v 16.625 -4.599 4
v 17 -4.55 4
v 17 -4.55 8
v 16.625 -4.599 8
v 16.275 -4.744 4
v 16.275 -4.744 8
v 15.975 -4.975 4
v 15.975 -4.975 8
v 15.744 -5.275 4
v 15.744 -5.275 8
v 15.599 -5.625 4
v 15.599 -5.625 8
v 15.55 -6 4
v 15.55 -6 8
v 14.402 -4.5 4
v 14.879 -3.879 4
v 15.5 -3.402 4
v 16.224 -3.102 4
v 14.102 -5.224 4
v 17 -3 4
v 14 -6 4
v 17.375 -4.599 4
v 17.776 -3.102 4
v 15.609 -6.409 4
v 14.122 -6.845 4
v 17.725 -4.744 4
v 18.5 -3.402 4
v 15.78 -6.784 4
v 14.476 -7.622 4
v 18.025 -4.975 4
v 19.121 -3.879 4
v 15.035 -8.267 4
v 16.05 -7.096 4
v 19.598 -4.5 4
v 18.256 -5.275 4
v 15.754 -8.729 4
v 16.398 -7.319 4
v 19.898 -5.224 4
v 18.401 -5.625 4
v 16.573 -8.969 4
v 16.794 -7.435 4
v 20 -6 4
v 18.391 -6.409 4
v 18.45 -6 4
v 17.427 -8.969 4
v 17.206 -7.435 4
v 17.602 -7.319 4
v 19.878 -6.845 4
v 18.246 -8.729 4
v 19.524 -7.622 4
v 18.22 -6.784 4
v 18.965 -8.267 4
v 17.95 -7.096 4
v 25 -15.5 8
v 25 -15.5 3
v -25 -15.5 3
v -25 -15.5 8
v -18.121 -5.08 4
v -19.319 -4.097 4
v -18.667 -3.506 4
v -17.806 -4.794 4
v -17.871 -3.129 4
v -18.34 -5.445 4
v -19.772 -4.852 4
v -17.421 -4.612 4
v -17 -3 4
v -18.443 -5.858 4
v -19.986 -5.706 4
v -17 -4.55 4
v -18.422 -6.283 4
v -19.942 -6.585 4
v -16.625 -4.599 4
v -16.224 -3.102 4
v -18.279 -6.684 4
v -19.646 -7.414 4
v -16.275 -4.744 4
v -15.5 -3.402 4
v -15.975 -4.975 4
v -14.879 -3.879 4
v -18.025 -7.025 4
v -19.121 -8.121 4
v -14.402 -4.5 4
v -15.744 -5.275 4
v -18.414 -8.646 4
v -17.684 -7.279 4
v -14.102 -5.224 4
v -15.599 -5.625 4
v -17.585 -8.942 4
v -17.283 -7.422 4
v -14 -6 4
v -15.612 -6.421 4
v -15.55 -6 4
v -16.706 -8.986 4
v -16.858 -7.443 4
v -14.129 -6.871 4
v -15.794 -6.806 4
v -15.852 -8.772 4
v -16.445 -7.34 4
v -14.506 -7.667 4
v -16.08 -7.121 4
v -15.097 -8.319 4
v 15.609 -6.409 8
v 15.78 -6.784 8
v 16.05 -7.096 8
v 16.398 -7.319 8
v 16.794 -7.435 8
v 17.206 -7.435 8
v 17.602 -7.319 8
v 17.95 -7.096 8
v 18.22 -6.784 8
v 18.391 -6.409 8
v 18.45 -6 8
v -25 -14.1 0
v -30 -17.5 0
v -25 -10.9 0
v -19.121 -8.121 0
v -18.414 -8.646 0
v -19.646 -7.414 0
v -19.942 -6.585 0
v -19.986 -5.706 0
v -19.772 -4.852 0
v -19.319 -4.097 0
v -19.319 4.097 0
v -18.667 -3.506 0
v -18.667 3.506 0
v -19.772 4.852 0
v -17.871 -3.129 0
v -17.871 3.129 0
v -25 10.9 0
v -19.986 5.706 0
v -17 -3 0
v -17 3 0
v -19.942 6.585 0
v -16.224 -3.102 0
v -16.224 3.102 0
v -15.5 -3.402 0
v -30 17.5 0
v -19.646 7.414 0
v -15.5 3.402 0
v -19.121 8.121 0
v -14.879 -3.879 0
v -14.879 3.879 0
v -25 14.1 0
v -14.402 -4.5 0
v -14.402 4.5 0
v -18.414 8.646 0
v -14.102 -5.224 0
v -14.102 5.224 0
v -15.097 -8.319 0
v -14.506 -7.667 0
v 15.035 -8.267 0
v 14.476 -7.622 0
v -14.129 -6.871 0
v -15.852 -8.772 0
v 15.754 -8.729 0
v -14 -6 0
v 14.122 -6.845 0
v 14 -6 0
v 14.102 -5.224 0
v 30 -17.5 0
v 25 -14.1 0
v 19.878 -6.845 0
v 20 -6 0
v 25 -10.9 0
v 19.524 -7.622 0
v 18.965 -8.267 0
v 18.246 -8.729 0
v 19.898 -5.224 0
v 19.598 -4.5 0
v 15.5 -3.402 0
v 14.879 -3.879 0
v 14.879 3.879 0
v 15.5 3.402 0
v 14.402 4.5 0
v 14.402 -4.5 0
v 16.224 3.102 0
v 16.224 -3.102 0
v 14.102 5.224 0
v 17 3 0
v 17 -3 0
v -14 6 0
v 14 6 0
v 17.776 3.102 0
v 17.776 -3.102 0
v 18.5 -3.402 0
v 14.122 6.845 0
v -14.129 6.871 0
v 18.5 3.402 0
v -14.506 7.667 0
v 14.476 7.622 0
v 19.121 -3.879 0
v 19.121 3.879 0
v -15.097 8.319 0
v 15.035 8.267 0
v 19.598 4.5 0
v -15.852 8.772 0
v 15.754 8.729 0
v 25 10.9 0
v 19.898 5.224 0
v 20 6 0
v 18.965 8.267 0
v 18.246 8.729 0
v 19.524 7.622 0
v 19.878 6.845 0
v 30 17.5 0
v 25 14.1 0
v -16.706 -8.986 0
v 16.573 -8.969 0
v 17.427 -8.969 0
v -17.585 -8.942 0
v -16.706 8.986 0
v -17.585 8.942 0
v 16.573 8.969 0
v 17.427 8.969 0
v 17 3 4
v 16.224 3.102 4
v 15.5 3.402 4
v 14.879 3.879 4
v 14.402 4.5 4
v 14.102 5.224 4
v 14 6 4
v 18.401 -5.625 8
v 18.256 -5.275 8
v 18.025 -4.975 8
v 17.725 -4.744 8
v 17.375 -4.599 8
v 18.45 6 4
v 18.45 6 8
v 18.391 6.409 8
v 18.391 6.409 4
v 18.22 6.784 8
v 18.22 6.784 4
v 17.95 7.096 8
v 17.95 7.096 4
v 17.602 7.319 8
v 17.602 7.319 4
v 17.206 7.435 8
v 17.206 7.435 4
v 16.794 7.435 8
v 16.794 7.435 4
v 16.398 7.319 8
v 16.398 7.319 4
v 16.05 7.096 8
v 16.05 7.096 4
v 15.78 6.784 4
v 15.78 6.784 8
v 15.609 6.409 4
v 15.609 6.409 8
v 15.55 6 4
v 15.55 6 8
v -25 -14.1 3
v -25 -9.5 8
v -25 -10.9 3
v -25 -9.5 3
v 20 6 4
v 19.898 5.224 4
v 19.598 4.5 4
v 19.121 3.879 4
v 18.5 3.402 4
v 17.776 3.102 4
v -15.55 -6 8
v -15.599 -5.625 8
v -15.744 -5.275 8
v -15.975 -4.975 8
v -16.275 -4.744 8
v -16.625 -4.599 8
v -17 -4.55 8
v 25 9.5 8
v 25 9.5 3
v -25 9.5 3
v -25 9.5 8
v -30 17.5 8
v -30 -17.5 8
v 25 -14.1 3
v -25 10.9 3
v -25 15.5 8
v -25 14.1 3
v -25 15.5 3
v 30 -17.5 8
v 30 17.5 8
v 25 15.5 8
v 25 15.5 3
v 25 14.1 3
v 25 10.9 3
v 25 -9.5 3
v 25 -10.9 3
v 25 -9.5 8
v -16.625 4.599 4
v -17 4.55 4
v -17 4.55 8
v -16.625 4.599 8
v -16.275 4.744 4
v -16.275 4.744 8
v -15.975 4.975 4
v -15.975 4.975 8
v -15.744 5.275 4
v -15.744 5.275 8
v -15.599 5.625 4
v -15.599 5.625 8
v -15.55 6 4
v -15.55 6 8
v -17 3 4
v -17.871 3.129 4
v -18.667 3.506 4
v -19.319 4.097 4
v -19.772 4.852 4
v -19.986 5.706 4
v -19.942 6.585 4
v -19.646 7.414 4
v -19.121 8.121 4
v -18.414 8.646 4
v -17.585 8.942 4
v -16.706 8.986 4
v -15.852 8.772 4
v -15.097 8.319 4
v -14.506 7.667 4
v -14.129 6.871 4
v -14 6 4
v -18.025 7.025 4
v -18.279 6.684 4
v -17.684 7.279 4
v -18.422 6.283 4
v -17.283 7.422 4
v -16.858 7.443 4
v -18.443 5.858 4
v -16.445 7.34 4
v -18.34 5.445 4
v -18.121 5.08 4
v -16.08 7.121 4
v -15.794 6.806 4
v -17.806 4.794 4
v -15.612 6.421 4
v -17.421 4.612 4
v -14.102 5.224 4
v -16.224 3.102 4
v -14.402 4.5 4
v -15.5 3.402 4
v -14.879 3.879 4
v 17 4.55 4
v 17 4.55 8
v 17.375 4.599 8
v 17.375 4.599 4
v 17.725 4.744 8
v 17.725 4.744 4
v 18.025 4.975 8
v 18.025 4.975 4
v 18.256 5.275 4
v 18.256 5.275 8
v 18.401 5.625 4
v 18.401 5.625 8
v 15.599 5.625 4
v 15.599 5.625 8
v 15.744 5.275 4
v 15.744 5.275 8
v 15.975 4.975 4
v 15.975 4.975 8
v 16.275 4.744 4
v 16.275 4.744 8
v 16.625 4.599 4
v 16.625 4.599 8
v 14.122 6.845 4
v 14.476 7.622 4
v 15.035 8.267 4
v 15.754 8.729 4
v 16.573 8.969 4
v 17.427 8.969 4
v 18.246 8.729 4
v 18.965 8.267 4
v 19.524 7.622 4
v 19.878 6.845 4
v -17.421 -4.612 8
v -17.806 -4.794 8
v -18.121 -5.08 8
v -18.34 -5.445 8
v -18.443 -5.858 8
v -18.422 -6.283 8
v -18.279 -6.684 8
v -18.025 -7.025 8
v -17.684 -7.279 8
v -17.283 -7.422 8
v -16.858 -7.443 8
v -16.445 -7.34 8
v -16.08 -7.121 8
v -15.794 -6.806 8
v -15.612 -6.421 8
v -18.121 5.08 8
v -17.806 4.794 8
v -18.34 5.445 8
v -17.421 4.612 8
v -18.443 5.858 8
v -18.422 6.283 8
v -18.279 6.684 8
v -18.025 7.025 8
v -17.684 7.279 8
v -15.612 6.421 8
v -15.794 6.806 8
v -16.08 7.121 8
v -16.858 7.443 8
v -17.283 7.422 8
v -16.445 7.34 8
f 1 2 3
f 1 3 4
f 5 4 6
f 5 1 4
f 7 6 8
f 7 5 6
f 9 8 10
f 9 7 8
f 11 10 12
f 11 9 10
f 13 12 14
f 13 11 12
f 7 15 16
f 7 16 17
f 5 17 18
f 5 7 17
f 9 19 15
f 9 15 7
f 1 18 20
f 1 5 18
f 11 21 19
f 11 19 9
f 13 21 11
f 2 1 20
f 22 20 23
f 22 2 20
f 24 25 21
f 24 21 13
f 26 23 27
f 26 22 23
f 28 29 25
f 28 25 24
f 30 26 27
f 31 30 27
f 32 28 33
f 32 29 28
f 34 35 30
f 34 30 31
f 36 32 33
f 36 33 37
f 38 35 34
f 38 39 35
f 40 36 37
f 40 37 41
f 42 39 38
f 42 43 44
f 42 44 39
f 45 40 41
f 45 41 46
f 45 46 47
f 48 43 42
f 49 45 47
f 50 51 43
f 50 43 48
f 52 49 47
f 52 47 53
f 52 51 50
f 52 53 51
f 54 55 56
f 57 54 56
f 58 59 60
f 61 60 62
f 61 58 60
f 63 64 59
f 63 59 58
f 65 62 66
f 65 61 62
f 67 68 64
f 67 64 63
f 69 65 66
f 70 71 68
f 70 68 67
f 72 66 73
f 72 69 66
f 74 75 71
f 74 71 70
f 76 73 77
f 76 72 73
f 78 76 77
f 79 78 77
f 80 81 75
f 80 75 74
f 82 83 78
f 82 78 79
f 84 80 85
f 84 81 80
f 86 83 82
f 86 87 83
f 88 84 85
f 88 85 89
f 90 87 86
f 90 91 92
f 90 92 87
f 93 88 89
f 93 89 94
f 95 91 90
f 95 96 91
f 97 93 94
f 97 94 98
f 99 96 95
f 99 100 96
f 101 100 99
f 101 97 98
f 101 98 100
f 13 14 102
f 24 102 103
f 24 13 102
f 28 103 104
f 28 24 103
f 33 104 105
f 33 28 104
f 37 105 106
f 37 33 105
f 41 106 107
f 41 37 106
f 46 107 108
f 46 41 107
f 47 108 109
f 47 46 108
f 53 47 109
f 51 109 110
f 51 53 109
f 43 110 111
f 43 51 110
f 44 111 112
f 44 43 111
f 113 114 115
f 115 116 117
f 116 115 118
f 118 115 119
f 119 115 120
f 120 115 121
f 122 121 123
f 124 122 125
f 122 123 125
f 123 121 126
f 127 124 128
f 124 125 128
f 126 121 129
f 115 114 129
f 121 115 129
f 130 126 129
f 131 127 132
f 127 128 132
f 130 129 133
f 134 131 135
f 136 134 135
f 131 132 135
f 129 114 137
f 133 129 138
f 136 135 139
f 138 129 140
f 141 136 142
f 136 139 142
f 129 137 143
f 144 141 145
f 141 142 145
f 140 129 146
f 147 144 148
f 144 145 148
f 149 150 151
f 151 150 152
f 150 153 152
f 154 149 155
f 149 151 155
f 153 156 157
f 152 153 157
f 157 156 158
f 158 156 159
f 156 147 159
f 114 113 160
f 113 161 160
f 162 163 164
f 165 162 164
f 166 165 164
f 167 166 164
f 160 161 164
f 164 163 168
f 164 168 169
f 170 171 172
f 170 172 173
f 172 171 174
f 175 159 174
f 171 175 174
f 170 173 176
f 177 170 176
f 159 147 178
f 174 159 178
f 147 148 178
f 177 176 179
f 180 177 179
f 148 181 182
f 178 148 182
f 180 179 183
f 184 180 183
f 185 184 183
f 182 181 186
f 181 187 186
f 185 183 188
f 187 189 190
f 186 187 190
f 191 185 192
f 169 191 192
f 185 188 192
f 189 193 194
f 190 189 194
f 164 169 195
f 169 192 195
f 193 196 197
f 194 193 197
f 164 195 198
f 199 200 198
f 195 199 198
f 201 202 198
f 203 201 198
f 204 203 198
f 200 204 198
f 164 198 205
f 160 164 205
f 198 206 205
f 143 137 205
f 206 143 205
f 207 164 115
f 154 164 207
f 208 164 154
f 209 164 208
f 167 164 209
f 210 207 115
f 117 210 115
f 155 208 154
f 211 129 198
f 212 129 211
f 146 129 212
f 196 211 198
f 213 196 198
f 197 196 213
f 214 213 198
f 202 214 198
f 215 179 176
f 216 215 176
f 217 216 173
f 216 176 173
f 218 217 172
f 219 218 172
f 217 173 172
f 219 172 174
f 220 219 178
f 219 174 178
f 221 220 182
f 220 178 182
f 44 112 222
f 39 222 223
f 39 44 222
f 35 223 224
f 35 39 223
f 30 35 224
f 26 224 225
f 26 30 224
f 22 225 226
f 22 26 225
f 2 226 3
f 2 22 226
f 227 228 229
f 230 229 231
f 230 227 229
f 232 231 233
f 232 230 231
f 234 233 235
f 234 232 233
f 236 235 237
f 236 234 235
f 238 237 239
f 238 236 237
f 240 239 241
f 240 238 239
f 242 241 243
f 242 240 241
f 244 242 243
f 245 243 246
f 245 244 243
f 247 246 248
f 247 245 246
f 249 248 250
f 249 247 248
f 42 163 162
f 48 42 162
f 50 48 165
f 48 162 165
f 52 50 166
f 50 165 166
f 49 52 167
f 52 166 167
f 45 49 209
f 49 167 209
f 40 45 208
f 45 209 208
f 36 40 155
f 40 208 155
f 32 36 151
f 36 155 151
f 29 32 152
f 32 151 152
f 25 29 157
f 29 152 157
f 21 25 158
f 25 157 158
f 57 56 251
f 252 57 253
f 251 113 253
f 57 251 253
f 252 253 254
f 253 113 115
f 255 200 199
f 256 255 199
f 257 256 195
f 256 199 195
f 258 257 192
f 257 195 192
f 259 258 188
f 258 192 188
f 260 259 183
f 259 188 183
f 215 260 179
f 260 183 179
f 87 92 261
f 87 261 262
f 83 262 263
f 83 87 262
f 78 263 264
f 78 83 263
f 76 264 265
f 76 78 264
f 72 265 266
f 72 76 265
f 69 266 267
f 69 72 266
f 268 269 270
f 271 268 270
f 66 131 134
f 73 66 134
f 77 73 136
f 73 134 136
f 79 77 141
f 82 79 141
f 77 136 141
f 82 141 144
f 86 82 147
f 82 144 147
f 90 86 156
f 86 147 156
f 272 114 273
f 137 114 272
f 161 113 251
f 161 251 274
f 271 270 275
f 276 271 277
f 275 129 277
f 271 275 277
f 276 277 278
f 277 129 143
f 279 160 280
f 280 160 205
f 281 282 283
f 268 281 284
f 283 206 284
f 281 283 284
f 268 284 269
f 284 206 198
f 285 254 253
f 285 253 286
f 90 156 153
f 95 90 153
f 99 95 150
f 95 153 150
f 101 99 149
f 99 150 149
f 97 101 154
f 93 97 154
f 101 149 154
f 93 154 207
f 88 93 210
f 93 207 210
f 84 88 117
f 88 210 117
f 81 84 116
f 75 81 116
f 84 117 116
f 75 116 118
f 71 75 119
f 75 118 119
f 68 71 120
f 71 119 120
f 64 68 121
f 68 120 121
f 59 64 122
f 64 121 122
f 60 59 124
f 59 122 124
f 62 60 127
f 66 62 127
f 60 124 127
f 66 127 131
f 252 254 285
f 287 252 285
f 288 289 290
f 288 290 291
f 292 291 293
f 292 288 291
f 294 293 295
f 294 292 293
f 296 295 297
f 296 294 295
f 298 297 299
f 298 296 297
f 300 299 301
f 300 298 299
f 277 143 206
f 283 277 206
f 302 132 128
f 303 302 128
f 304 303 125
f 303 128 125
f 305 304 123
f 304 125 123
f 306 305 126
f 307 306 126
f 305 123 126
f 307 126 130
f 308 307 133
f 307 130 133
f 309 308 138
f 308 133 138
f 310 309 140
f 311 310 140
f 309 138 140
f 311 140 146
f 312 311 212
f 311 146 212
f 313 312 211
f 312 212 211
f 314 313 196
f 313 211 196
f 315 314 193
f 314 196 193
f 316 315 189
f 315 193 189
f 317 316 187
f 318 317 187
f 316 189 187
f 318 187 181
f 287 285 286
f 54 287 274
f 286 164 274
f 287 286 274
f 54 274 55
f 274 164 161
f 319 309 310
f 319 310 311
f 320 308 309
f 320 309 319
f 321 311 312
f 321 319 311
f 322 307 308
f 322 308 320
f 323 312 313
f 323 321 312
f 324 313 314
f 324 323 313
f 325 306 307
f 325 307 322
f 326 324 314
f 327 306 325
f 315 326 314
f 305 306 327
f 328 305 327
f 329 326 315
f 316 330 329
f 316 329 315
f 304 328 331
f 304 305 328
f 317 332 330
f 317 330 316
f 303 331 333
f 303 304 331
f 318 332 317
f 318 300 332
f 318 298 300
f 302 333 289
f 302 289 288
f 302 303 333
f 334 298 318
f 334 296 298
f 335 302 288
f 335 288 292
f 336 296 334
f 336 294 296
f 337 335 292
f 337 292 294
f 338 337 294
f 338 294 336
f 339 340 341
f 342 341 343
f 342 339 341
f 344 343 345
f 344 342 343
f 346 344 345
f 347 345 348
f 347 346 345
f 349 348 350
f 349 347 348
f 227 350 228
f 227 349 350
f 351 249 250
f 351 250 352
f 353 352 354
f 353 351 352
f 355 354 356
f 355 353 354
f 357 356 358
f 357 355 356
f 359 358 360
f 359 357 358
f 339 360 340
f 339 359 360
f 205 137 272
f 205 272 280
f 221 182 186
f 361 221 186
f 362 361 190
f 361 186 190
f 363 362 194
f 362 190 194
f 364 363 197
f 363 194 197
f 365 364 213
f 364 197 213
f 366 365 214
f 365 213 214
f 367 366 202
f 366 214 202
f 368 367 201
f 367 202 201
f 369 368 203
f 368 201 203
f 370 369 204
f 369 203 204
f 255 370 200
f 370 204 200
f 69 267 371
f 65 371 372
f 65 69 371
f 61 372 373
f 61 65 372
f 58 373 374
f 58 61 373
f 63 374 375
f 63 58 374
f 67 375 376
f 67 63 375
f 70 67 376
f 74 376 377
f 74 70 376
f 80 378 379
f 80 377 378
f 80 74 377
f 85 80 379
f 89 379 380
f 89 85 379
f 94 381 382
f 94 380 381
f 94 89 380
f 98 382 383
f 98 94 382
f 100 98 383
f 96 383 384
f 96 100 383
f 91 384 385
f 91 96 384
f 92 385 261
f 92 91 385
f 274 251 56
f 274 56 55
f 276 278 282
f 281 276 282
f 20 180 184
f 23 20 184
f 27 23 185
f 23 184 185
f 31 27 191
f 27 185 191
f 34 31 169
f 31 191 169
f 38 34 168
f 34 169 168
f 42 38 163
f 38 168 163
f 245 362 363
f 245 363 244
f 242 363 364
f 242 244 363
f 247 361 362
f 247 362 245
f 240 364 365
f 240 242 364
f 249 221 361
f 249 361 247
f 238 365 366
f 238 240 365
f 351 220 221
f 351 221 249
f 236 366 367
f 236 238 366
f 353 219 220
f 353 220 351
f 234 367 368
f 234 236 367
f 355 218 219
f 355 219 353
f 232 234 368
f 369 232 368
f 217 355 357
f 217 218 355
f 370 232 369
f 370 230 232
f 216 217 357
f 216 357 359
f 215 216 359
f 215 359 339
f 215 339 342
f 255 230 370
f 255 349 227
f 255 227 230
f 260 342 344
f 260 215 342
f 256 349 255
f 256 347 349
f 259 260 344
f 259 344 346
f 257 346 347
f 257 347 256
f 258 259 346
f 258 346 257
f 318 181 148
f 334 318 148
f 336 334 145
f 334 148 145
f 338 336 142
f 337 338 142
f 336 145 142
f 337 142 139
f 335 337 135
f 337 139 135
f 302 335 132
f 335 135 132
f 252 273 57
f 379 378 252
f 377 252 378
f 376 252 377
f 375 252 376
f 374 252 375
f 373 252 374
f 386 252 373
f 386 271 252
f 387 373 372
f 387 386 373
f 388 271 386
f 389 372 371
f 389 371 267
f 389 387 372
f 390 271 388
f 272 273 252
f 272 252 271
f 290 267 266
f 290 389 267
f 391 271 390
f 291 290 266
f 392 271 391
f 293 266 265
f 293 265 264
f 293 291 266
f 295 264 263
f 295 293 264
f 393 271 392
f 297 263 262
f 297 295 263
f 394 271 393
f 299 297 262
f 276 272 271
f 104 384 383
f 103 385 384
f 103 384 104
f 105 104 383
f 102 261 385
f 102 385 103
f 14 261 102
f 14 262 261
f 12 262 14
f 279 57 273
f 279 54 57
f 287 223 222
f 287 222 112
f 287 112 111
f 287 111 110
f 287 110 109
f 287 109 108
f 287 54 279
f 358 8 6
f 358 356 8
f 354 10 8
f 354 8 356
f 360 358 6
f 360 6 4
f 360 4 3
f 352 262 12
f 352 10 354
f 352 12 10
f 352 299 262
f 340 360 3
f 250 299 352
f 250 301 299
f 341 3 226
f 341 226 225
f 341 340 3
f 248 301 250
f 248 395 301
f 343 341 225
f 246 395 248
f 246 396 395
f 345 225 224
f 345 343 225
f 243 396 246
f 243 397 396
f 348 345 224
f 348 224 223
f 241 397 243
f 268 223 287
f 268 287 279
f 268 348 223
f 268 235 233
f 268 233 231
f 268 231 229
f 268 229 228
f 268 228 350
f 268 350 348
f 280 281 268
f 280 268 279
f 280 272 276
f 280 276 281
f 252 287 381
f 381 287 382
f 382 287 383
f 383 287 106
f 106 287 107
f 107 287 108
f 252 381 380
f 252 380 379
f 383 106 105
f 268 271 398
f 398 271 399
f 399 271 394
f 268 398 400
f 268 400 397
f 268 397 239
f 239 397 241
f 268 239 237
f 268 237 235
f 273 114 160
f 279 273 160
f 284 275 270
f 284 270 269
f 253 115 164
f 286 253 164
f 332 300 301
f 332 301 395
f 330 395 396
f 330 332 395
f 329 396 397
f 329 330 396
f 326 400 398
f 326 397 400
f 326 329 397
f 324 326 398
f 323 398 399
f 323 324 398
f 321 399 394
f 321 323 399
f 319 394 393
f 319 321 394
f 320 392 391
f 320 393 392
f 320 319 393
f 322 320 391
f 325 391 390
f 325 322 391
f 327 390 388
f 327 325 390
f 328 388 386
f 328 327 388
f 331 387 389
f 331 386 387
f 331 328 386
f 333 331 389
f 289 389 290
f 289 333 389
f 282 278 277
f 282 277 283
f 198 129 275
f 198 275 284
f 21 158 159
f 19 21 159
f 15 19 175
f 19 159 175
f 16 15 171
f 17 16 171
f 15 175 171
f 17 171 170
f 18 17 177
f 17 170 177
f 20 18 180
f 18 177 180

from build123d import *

# Parameters (mm, degrees)
F0_W     = 60
F0_H     = 35
F1_DEPTH = 8
F0_W_2   = 50
F0_H_2   = 1.4
F2_DEPTH = 3
F4_DEPTH = 4
F5_DEPTH = 25


with BuildPart() as f1:
    # F0 (on Top) → F1 (new body)
    with BuildSketch(Plane.XY):
        Rectangle(F0_W, F0_H)
        Polygon((-25, -10.9), (-25, -9.5), (25, -9.5), (25, -10.9), (25, -12.5), (25, -14.1), (25, -15.5), (-25, -15.5), (-25, -14.1), (-25, -12.5), align=None, mode=Mode.SUBTRACT)
        Polygon((-25, 10.9), (-25, 12.5), (-25, 14.1), (-25, 15.5), (25, 15.5), (25, 14.1), (25, 12.5), (25, 10.9), (25, 9.5), (-25, 9.5), align=None, mode=Mode.SUBTRACT)
    extrude(amount=F1_DEPTH)

    # F0 (on Top) → F2 (join)
    with BuildSketch(Plane.XY):
        with Locations((0, 14.8)):
            Rectangle(F0_W_2, F0_H_2)
        with Locations((0, 10.2)):
            Rectangle(F0_W_2, F0_H_2)
        with Locations((0, -10.2)):
            Rectangle(F0_W_2, F0_H_2)
        with Locations((0, -14.8)):
            Rectangle(F0_W_2, F0_H_2)
    extrude(amount=F2_DEPTH)

    # F3 (on face) → F4 (cut)
    with BuildSketch(Plane(origin=(0, 0, 0), x_dir=(1, 0, 0), z_dir=(0, 0, -1))):
        with BuildLine():
            ThreePointArc((-14, 6), (-19.1213203436, 8.1213203436), (-17, 3))
            Line((-17, 3), (-17, 4.55))
            ThreePointArc((-17, 4.55), (-18.0253048327, 7.0253048327), (-15.55, 6))
            Line((-15.55, 6), (-14, 6))
        make_face()
        with BuildLine():
            Line((-17, 4.55), (-17, 3))
            ThreePointArc((-17, 3), (-14.8786796564, 3.8786796564), (-14, 6))
            Line((-14, 6), (-15.55, 6))
            ThreePointArc((-15.55, 6), (-15.9746951673, 4.9746951673), (-17, 4.55))
        make_face()
        with BuildLine():
            ThreePointArc((-17, -3), (-19.1213203436, -8.1213203436), (-14, -6))
            Line((-14, -6), (-15.55, -6))
            ThreePointArc((-15.55, -6), (-18.0253048327, -7.0253048327), (-17, -4.55))
            Line((-17, -4.55), (-17, -3))
        make_face()
        with BuildLine():
            Line((-15.55, -6), (-14, -6))
            ThreePointArc((-14, -6), (-14.8786796564, -3.8786796564), (-17, -3))
            Line((-17, -3), (-17, -4.55))
            ThreePointArc((-17, -4.55), (-15.9746951673, -4.9746951673), (-15.55, -6))
        make_face()
        with BuildLine():
            ThreePointArc((14, 6), (14.8786796564, 3.8786796564), (17, 3))
            Line((17, 3), (17, 4.55))
            ThreePointArc((17, 4.55), (15.9746951673, 4.9746951673), (15.55, 6))
            Line((15.55, 6), (14, 6))
        make_face()
        with BuildLine():
            Line((17, 4.55), (17, 3))
            ThreePointArc((17, 3), (19.1213203436, 3.8786796564), (20, 6))
            ThreePointArc((20, 6), (17, 9), (14, 6))
            Line((14, 6), (15.55, 6))
            ThreePointArc((15.55, 6), (17, 7.45), (18.45, 6))
            ThreePointArc((18.45, 6), (18.0253048327, 4.9746951673), (17, 4.55))
        make_face()
        with BuildLine():
            ThreePointArc((17, -3), (14.8786796564, -3.8786796564), (14, -6))
            Line((14, -6), (15.55, -6))
            ThreePointArc((15.55, -6), (15.9746951673, -4.9746951673), (17, -4.55))
            Line((17, -4.55), (17, -3))
        make_face()
        with BuildLine():
            Line((15.55, -6), (14, -6))
            ThreePointArc((14, -6), (17, -9), (20, -6))
            ThreePointArc((20, -6), (19.1213203436, -3.8786796564), (17, -3))
            Line((17, -3), (17, -4.55))
            ThreePointArc((17, -4.55), (18.0253048327, -4.9746951673), (18.45, -6))
            ThreePointArc((18.45, -6), (17, -7.45), (15.55, -6))
        make_face()
    extrude(amount=-F4_DEPTH, mode=Mode.SUBTRACT)

    # F5 (cut): faces of the model
    f5_faces = [f1.faces().sort_by_distance(p)[0] for p in [
        (-17, 6, 0),
        (17, 6, 0),
        (17, -6, 0),
        (-17, -6, 0),
    ]]
    extrude(f5_faces, amount=-F5_DEPTH, mode=Mode.SUBTRACT)


solid = f1.part
